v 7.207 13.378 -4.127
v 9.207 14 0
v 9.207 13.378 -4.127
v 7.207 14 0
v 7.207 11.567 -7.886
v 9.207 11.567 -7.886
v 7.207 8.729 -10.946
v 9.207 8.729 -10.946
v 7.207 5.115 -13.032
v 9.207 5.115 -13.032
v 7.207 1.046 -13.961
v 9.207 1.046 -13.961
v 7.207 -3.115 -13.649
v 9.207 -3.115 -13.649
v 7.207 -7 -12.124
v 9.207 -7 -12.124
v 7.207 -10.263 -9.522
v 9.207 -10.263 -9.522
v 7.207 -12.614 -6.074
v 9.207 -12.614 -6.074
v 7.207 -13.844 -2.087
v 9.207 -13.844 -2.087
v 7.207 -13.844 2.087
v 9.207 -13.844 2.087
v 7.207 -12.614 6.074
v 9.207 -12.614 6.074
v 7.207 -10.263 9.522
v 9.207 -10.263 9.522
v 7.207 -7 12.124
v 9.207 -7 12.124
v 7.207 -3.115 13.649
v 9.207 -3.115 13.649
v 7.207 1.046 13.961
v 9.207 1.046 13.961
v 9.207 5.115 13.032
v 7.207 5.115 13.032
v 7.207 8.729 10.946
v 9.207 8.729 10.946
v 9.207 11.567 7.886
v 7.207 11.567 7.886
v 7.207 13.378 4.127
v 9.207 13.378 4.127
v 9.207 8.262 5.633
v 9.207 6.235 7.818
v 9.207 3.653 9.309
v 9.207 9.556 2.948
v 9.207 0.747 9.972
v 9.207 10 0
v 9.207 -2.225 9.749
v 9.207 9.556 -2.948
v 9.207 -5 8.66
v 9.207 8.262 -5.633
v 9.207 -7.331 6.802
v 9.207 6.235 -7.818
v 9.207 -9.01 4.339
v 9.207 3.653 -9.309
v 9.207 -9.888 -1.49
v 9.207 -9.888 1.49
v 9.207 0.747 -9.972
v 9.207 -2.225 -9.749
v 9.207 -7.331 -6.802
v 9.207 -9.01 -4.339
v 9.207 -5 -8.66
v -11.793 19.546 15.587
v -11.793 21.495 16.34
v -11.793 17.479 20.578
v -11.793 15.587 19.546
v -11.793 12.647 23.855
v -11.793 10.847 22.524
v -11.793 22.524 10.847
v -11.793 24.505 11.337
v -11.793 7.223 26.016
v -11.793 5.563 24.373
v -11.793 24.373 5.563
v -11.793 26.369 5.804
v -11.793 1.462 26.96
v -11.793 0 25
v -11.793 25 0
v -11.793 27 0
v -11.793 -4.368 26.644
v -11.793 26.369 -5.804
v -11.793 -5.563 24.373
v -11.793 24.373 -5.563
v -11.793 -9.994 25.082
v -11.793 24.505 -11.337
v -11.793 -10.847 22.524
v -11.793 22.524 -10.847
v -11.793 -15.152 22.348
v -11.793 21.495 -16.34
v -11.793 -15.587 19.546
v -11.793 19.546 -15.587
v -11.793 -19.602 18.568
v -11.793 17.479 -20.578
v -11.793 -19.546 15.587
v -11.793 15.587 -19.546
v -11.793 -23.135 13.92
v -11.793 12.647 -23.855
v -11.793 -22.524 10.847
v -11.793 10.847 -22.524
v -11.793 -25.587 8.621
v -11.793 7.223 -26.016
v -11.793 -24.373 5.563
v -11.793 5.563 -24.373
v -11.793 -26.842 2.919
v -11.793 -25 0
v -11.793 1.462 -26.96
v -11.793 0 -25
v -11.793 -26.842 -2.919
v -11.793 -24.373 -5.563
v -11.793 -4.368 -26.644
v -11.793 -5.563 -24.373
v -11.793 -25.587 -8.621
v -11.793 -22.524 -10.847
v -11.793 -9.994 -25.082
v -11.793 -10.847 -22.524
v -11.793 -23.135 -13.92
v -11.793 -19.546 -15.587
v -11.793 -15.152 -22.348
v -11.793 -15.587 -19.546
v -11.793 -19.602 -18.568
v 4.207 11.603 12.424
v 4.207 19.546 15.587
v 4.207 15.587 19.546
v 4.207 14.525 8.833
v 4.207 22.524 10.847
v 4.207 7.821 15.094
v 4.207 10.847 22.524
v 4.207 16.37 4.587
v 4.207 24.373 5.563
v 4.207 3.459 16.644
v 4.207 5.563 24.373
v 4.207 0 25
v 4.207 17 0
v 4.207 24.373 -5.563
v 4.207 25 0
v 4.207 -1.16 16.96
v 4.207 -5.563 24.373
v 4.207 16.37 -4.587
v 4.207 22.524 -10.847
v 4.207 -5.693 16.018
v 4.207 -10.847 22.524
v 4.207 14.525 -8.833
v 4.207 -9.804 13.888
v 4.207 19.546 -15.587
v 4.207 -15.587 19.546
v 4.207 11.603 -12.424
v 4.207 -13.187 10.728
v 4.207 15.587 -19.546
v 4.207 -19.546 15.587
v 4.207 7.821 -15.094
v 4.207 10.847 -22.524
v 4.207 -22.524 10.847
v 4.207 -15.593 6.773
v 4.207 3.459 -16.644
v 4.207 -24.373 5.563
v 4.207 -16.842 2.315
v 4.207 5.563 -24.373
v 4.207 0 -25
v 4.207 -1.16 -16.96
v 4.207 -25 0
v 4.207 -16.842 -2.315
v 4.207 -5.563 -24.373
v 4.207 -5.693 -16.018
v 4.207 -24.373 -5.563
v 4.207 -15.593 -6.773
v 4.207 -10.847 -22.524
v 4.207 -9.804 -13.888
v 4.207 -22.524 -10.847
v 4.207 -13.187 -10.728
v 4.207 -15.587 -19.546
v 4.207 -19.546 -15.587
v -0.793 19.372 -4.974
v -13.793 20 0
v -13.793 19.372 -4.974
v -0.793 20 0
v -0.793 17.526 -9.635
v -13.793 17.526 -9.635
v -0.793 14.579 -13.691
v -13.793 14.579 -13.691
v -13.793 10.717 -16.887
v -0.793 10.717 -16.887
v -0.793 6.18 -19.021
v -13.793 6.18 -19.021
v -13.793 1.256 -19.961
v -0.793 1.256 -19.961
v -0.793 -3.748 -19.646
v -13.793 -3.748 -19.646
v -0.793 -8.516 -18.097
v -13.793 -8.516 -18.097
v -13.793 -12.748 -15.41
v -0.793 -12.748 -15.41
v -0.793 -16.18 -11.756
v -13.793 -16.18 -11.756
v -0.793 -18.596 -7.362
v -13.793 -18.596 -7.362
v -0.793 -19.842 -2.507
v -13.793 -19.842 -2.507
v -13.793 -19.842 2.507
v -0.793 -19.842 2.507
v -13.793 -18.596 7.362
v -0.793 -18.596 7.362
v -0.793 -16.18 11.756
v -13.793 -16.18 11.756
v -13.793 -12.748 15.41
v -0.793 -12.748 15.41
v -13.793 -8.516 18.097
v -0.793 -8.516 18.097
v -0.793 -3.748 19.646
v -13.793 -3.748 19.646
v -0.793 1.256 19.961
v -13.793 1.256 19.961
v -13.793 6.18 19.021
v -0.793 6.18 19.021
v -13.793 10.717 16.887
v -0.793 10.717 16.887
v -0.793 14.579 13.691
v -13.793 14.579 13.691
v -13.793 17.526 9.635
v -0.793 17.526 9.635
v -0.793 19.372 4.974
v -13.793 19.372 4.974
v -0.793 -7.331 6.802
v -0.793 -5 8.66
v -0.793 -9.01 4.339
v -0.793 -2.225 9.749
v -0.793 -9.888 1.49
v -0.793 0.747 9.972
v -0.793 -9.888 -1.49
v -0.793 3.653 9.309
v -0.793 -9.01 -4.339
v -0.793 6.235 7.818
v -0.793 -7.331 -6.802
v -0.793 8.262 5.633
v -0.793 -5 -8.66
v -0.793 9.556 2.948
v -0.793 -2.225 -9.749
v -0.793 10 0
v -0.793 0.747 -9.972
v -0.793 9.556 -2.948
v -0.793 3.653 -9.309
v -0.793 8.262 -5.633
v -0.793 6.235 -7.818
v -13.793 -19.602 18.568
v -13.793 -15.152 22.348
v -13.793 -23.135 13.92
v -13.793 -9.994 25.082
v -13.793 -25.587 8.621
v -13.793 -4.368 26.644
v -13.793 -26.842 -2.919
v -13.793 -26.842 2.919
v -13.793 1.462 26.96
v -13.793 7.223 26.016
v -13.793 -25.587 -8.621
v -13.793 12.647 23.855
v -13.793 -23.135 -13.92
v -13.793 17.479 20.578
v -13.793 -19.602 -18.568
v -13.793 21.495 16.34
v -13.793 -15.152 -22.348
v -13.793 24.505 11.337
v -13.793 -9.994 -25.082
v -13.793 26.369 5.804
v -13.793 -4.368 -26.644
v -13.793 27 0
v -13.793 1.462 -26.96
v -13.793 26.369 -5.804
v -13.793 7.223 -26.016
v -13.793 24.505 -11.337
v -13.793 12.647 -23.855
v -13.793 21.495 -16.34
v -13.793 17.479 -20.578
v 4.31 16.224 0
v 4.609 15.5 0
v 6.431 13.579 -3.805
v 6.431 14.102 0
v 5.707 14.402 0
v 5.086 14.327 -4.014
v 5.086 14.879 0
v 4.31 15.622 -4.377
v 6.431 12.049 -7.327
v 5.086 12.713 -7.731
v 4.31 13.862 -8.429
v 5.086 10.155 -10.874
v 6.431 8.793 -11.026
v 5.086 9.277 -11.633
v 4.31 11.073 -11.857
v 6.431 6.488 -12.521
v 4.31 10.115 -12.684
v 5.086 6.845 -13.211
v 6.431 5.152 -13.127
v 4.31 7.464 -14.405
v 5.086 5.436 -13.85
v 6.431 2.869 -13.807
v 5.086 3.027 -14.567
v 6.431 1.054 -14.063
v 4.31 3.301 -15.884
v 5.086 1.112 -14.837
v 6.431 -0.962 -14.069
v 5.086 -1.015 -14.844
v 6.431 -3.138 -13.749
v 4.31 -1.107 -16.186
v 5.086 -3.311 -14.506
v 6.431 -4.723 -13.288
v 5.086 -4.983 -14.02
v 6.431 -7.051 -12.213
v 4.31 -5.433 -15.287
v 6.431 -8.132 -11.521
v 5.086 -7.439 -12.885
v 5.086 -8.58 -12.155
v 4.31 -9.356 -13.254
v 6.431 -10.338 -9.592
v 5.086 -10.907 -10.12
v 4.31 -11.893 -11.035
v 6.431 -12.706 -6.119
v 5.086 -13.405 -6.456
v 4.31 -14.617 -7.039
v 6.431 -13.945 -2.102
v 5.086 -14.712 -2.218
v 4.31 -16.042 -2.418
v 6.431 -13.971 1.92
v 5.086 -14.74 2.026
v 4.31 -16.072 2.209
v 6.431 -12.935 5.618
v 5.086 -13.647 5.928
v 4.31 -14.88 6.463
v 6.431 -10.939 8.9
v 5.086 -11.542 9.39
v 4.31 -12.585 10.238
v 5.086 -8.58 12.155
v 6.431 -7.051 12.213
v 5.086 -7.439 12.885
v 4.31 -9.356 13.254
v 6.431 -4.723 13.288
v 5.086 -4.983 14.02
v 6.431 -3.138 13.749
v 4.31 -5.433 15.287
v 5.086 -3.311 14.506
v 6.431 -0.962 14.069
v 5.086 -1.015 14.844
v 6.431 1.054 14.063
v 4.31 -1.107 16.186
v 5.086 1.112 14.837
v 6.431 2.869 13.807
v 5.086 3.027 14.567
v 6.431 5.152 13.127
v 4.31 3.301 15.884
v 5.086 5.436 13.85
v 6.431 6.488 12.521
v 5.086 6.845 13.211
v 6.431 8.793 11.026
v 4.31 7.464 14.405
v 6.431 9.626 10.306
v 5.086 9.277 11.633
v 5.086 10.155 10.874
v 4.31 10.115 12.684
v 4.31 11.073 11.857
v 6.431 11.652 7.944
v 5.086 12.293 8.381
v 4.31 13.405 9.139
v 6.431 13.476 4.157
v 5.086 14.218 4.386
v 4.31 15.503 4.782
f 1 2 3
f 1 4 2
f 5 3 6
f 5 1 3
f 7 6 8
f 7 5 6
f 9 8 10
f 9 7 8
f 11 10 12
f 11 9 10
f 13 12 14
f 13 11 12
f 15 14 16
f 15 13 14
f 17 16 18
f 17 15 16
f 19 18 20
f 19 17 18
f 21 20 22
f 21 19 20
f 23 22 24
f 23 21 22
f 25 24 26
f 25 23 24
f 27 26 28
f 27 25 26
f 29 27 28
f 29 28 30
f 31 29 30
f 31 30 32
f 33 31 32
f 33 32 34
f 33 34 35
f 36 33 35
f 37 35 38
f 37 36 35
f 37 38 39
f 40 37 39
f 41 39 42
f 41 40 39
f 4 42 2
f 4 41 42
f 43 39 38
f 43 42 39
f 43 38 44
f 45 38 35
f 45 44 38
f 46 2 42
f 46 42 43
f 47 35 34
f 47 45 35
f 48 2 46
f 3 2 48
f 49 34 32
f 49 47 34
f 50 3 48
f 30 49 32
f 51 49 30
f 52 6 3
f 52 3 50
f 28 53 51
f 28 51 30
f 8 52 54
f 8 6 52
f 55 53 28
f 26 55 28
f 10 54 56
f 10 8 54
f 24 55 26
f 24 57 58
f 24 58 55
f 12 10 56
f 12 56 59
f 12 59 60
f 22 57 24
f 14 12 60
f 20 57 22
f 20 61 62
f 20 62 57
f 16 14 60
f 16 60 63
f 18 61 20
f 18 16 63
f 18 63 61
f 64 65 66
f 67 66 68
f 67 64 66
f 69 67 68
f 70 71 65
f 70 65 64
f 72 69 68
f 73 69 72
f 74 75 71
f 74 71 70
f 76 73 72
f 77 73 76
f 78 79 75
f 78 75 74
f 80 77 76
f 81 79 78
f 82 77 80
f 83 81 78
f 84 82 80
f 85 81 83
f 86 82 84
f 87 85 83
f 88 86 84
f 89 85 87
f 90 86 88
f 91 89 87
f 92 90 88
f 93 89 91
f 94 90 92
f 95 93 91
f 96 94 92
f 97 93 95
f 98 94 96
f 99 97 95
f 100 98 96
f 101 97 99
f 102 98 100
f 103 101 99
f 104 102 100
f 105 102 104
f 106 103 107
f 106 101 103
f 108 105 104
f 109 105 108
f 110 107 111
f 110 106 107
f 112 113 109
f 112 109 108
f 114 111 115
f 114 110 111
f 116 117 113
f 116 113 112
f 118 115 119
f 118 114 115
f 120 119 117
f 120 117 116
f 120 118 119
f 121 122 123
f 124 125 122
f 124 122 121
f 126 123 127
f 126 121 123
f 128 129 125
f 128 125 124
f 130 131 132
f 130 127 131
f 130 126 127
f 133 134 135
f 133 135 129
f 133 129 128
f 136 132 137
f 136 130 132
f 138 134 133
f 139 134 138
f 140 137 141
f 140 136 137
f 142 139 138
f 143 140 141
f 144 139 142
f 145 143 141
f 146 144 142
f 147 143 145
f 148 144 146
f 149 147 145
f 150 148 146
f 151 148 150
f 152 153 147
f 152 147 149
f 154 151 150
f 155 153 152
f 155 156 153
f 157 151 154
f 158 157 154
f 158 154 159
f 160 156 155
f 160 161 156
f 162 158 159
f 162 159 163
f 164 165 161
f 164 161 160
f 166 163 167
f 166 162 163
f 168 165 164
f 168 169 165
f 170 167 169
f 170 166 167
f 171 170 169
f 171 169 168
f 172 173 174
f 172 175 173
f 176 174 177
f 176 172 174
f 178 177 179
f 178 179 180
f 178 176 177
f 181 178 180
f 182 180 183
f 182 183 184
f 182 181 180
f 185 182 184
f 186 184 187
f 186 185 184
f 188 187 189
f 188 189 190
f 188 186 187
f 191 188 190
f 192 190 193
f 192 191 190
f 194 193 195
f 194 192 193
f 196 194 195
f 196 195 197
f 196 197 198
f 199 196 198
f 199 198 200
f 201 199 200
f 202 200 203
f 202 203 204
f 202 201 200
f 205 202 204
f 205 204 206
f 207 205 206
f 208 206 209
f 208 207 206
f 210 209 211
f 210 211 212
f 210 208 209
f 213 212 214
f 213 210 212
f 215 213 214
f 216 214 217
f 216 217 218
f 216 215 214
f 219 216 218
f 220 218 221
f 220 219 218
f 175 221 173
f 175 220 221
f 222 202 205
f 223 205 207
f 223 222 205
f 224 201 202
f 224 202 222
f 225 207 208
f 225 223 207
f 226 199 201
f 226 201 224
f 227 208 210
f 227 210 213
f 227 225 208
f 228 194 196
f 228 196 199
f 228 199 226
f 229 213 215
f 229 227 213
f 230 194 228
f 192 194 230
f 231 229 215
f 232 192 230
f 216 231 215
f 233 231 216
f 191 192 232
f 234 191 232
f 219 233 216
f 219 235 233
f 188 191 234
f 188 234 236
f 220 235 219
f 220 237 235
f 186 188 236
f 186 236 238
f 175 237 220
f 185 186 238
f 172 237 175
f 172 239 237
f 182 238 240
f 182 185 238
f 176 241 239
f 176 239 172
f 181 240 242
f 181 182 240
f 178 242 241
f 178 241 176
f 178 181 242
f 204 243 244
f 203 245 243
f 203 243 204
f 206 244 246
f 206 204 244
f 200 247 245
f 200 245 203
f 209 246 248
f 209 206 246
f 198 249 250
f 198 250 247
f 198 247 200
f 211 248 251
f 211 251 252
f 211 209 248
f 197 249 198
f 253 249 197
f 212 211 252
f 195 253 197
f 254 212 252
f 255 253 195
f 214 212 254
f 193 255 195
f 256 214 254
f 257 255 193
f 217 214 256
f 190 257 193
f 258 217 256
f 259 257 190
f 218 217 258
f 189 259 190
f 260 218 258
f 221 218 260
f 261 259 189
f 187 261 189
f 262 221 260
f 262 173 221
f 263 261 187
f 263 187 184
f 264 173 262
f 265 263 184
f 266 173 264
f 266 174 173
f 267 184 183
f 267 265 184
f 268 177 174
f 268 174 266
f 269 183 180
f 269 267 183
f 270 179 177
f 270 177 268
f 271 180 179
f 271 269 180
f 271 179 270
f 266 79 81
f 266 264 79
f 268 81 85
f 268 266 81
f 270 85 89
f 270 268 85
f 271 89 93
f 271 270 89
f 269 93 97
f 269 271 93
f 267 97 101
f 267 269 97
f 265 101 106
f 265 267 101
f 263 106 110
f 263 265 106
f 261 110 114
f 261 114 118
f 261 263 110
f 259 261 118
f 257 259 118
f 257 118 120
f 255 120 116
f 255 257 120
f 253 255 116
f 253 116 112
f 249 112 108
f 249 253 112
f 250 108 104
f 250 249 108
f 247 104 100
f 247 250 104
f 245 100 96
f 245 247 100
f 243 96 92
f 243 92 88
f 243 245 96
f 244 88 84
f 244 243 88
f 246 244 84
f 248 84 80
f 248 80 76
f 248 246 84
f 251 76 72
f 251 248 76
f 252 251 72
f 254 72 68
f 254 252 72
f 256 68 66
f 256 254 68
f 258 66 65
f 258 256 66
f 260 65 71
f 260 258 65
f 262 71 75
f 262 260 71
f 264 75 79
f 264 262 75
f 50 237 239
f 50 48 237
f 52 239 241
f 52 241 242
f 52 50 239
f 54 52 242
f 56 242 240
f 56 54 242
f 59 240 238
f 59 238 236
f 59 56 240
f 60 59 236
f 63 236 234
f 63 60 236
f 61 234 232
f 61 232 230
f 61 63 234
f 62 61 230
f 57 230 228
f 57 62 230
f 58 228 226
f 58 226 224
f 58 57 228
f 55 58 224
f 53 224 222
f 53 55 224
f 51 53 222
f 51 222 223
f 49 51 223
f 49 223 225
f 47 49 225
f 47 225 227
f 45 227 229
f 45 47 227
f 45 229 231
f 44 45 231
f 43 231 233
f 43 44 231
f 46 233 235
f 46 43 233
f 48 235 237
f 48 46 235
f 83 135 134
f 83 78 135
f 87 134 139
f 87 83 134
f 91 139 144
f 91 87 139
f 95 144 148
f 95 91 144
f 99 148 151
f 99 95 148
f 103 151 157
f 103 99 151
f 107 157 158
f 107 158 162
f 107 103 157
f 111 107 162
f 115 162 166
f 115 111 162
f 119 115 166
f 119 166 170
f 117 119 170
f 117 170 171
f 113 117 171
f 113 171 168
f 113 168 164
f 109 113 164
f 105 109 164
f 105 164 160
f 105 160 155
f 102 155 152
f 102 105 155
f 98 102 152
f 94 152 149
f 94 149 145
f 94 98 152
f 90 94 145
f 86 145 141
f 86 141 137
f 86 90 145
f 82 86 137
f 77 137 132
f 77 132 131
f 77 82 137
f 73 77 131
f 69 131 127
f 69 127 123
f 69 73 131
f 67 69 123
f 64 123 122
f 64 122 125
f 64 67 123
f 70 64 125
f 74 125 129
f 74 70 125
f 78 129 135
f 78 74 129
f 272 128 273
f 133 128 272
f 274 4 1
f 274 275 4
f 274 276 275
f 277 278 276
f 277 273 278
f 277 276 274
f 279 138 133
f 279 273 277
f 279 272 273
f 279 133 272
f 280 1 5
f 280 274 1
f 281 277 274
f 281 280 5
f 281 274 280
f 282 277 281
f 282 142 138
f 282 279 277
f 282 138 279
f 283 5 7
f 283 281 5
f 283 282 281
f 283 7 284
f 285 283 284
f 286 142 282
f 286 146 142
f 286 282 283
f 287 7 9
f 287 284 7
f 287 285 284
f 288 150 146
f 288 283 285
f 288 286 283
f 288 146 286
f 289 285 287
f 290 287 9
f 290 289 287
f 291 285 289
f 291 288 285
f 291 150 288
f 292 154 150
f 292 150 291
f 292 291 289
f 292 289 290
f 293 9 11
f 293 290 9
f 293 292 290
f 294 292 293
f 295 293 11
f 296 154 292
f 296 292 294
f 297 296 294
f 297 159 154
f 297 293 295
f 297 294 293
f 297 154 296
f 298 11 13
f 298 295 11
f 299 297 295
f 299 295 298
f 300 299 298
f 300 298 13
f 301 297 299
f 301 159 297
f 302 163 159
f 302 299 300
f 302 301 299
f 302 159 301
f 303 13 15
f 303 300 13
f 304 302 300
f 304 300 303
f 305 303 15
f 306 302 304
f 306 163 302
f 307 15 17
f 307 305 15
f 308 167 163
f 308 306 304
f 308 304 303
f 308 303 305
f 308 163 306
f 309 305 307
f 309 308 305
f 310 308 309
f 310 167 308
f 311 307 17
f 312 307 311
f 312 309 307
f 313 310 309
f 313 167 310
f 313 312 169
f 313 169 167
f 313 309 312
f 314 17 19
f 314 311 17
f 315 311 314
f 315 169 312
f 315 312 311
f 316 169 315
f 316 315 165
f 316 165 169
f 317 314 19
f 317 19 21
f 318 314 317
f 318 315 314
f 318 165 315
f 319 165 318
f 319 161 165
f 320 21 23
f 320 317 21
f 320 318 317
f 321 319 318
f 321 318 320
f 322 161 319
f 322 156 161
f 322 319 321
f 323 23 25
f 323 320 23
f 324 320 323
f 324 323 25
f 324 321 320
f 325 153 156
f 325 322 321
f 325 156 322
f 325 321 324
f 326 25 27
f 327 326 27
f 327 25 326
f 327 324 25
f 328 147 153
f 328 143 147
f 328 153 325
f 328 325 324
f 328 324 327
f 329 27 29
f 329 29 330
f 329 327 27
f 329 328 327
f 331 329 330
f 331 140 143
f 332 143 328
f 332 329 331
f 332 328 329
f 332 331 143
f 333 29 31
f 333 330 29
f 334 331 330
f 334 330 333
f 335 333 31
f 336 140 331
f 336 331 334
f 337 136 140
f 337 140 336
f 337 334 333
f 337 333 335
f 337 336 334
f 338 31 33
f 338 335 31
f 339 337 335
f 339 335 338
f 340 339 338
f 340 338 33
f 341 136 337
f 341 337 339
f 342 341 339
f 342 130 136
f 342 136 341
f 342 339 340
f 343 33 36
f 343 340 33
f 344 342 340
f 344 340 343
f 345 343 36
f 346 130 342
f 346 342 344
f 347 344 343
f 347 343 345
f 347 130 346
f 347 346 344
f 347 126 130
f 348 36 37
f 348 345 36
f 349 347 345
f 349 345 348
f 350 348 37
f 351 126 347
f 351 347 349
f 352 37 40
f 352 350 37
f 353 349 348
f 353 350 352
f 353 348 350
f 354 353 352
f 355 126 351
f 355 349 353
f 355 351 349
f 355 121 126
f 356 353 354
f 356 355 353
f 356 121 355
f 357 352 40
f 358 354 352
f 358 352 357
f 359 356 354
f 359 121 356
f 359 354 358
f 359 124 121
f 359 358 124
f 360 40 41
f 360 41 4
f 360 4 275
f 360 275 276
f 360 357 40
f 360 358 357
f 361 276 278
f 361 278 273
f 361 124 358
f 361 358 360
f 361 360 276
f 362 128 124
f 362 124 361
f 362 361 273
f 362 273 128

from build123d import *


with BuildPart() as part:
    # Sketch1 → Revolve1 (revolve)
    with BuildSketch(Plane.XY):
        with BuildLine():
            Line((9.207453271, 10), (9.207453271, 14))
            Line((9.207453271, 14), (7.207453271, 14))
            ThreePointArc((7.207453271, 14), (5.086132927, 14.878679656), (4.207453271, 17))
            Line((4.207453271, 17), (4.207453271, 25))
            Line((4.207453271, 25), (-11.792546729, 25))
            Line((-11.792546729, 25), (-11.792546729, 27))
            Line((-11.792546729, 27), (-13.792546729, 27))
            Line((-13.792546729, 27), (-13.792546729, 20))
            Line((-13.792546729, 20), (-0.792546729, 20))
            Line((-0.792546729, 20), (-0.792546729, 10))
            Line((-0.792546729, 10), (9.207453271, 10))
        make_face()
    revolve(axis=Axis((9.207453271, 0, 0), (-1, 0, 0)))


solid = part.part
